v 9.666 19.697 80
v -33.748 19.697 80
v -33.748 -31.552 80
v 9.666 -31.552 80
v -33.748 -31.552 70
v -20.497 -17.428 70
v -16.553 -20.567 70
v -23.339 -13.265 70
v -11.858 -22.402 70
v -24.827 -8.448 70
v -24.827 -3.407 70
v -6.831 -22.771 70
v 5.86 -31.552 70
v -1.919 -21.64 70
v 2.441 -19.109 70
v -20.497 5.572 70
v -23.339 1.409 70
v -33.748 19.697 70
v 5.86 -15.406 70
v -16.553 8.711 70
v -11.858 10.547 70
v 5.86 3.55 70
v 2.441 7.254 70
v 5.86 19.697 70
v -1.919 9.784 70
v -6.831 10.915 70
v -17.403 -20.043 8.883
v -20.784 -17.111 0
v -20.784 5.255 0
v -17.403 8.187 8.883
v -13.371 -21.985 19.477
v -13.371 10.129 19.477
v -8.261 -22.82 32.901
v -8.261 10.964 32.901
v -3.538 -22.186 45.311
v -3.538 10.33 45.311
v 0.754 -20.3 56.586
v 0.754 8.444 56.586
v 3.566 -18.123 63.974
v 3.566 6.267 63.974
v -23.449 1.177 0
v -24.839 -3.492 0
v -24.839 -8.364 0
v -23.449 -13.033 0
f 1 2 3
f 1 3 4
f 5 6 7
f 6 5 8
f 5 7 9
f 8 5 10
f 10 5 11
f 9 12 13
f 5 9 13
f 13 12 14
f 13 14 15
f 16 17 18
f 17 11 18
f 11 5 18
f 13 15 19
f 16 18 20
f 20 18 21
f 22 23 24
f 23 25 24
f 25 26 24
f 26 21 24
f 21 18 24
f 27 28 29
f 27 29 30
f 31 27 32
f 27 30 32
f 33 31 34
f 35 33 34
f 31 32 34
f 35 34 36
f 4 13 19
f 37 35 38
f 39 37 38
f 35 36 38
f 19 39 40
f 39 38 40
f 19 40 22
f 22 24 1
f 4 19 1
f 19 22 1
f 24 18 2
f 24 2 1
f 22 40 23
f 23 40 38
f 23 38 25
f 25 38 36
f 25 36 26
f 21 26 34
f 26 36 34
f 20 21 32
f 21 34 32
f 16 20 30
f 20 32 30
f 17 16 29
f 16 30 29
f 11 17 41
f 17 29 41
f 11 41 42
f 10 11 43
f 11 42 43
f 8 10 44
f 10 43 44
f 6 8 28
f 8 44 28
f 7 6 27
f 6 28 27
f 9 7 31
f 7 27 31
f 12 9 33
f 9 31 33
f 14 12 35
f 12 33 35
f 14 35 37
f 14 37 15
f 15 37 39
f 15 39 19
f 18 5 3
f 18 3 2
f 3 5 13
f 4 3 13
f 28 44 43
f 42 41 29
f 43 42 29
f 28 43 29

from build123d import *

# Parameters (mm, degrees)
SKETCH1_R               = 16.892448346
BOSS_EXTRUDE1_DEPTH     = 70
SKETCH2_W               = 51.249127752
SKETCH2_H               = 51.249127751
BOSS_EXTRUDE2_DEPTH     = 10
CUT_EXTRUDE1_DEPTH      = 20.696737014
CUT_EXTRUDE1_DEPTH_BACK = 32.552390737


with BuildPart() as part:
    # Sketch1 → Boss-Extrude1 (new body)
    with BuildSketch(Plane.XY):
        with Locations((-8.123318292, -5.927826862)):
            Circle(SKETCH1_R)
    extrude(amount=BOSS_EXTRUDE1_DEPTH)

    # Sketch2 → Boss-Extrude2 (add)
    with BuildSketch(Plane.XY.offset(70)):
        with Locations((-8.123318292, -5.927826862)):
            Rectangle(SKETCH2_W, SKETCH2_H)
    extrude(amount=BOSS_EXTRUDE2_DEPTH)

    # Sketch3 → Cut-Extrude1 (cut, two sides)
    with BuildSketch(Plane(origin=(0, 0, 0), x_dir=(1, 0, 0), z_dir=(0, 1, 0))) as cut_extrude1_sk:
        Polygon((-25.712291526, 12.946943155), (18.961130043, -104.420154992), (40.320792226, 8.610459854), align=None)
    extrude(amount=CUT_EXTRUDE1_DEPTH, mode=Mode.SUBTRACT)
    extrude(cut_extrude1_sk.sketch, amount=-CUT_EXTRUDE1_DEPTH_BACK, mode=Mode.SUBTRACT)


solid = part.part
